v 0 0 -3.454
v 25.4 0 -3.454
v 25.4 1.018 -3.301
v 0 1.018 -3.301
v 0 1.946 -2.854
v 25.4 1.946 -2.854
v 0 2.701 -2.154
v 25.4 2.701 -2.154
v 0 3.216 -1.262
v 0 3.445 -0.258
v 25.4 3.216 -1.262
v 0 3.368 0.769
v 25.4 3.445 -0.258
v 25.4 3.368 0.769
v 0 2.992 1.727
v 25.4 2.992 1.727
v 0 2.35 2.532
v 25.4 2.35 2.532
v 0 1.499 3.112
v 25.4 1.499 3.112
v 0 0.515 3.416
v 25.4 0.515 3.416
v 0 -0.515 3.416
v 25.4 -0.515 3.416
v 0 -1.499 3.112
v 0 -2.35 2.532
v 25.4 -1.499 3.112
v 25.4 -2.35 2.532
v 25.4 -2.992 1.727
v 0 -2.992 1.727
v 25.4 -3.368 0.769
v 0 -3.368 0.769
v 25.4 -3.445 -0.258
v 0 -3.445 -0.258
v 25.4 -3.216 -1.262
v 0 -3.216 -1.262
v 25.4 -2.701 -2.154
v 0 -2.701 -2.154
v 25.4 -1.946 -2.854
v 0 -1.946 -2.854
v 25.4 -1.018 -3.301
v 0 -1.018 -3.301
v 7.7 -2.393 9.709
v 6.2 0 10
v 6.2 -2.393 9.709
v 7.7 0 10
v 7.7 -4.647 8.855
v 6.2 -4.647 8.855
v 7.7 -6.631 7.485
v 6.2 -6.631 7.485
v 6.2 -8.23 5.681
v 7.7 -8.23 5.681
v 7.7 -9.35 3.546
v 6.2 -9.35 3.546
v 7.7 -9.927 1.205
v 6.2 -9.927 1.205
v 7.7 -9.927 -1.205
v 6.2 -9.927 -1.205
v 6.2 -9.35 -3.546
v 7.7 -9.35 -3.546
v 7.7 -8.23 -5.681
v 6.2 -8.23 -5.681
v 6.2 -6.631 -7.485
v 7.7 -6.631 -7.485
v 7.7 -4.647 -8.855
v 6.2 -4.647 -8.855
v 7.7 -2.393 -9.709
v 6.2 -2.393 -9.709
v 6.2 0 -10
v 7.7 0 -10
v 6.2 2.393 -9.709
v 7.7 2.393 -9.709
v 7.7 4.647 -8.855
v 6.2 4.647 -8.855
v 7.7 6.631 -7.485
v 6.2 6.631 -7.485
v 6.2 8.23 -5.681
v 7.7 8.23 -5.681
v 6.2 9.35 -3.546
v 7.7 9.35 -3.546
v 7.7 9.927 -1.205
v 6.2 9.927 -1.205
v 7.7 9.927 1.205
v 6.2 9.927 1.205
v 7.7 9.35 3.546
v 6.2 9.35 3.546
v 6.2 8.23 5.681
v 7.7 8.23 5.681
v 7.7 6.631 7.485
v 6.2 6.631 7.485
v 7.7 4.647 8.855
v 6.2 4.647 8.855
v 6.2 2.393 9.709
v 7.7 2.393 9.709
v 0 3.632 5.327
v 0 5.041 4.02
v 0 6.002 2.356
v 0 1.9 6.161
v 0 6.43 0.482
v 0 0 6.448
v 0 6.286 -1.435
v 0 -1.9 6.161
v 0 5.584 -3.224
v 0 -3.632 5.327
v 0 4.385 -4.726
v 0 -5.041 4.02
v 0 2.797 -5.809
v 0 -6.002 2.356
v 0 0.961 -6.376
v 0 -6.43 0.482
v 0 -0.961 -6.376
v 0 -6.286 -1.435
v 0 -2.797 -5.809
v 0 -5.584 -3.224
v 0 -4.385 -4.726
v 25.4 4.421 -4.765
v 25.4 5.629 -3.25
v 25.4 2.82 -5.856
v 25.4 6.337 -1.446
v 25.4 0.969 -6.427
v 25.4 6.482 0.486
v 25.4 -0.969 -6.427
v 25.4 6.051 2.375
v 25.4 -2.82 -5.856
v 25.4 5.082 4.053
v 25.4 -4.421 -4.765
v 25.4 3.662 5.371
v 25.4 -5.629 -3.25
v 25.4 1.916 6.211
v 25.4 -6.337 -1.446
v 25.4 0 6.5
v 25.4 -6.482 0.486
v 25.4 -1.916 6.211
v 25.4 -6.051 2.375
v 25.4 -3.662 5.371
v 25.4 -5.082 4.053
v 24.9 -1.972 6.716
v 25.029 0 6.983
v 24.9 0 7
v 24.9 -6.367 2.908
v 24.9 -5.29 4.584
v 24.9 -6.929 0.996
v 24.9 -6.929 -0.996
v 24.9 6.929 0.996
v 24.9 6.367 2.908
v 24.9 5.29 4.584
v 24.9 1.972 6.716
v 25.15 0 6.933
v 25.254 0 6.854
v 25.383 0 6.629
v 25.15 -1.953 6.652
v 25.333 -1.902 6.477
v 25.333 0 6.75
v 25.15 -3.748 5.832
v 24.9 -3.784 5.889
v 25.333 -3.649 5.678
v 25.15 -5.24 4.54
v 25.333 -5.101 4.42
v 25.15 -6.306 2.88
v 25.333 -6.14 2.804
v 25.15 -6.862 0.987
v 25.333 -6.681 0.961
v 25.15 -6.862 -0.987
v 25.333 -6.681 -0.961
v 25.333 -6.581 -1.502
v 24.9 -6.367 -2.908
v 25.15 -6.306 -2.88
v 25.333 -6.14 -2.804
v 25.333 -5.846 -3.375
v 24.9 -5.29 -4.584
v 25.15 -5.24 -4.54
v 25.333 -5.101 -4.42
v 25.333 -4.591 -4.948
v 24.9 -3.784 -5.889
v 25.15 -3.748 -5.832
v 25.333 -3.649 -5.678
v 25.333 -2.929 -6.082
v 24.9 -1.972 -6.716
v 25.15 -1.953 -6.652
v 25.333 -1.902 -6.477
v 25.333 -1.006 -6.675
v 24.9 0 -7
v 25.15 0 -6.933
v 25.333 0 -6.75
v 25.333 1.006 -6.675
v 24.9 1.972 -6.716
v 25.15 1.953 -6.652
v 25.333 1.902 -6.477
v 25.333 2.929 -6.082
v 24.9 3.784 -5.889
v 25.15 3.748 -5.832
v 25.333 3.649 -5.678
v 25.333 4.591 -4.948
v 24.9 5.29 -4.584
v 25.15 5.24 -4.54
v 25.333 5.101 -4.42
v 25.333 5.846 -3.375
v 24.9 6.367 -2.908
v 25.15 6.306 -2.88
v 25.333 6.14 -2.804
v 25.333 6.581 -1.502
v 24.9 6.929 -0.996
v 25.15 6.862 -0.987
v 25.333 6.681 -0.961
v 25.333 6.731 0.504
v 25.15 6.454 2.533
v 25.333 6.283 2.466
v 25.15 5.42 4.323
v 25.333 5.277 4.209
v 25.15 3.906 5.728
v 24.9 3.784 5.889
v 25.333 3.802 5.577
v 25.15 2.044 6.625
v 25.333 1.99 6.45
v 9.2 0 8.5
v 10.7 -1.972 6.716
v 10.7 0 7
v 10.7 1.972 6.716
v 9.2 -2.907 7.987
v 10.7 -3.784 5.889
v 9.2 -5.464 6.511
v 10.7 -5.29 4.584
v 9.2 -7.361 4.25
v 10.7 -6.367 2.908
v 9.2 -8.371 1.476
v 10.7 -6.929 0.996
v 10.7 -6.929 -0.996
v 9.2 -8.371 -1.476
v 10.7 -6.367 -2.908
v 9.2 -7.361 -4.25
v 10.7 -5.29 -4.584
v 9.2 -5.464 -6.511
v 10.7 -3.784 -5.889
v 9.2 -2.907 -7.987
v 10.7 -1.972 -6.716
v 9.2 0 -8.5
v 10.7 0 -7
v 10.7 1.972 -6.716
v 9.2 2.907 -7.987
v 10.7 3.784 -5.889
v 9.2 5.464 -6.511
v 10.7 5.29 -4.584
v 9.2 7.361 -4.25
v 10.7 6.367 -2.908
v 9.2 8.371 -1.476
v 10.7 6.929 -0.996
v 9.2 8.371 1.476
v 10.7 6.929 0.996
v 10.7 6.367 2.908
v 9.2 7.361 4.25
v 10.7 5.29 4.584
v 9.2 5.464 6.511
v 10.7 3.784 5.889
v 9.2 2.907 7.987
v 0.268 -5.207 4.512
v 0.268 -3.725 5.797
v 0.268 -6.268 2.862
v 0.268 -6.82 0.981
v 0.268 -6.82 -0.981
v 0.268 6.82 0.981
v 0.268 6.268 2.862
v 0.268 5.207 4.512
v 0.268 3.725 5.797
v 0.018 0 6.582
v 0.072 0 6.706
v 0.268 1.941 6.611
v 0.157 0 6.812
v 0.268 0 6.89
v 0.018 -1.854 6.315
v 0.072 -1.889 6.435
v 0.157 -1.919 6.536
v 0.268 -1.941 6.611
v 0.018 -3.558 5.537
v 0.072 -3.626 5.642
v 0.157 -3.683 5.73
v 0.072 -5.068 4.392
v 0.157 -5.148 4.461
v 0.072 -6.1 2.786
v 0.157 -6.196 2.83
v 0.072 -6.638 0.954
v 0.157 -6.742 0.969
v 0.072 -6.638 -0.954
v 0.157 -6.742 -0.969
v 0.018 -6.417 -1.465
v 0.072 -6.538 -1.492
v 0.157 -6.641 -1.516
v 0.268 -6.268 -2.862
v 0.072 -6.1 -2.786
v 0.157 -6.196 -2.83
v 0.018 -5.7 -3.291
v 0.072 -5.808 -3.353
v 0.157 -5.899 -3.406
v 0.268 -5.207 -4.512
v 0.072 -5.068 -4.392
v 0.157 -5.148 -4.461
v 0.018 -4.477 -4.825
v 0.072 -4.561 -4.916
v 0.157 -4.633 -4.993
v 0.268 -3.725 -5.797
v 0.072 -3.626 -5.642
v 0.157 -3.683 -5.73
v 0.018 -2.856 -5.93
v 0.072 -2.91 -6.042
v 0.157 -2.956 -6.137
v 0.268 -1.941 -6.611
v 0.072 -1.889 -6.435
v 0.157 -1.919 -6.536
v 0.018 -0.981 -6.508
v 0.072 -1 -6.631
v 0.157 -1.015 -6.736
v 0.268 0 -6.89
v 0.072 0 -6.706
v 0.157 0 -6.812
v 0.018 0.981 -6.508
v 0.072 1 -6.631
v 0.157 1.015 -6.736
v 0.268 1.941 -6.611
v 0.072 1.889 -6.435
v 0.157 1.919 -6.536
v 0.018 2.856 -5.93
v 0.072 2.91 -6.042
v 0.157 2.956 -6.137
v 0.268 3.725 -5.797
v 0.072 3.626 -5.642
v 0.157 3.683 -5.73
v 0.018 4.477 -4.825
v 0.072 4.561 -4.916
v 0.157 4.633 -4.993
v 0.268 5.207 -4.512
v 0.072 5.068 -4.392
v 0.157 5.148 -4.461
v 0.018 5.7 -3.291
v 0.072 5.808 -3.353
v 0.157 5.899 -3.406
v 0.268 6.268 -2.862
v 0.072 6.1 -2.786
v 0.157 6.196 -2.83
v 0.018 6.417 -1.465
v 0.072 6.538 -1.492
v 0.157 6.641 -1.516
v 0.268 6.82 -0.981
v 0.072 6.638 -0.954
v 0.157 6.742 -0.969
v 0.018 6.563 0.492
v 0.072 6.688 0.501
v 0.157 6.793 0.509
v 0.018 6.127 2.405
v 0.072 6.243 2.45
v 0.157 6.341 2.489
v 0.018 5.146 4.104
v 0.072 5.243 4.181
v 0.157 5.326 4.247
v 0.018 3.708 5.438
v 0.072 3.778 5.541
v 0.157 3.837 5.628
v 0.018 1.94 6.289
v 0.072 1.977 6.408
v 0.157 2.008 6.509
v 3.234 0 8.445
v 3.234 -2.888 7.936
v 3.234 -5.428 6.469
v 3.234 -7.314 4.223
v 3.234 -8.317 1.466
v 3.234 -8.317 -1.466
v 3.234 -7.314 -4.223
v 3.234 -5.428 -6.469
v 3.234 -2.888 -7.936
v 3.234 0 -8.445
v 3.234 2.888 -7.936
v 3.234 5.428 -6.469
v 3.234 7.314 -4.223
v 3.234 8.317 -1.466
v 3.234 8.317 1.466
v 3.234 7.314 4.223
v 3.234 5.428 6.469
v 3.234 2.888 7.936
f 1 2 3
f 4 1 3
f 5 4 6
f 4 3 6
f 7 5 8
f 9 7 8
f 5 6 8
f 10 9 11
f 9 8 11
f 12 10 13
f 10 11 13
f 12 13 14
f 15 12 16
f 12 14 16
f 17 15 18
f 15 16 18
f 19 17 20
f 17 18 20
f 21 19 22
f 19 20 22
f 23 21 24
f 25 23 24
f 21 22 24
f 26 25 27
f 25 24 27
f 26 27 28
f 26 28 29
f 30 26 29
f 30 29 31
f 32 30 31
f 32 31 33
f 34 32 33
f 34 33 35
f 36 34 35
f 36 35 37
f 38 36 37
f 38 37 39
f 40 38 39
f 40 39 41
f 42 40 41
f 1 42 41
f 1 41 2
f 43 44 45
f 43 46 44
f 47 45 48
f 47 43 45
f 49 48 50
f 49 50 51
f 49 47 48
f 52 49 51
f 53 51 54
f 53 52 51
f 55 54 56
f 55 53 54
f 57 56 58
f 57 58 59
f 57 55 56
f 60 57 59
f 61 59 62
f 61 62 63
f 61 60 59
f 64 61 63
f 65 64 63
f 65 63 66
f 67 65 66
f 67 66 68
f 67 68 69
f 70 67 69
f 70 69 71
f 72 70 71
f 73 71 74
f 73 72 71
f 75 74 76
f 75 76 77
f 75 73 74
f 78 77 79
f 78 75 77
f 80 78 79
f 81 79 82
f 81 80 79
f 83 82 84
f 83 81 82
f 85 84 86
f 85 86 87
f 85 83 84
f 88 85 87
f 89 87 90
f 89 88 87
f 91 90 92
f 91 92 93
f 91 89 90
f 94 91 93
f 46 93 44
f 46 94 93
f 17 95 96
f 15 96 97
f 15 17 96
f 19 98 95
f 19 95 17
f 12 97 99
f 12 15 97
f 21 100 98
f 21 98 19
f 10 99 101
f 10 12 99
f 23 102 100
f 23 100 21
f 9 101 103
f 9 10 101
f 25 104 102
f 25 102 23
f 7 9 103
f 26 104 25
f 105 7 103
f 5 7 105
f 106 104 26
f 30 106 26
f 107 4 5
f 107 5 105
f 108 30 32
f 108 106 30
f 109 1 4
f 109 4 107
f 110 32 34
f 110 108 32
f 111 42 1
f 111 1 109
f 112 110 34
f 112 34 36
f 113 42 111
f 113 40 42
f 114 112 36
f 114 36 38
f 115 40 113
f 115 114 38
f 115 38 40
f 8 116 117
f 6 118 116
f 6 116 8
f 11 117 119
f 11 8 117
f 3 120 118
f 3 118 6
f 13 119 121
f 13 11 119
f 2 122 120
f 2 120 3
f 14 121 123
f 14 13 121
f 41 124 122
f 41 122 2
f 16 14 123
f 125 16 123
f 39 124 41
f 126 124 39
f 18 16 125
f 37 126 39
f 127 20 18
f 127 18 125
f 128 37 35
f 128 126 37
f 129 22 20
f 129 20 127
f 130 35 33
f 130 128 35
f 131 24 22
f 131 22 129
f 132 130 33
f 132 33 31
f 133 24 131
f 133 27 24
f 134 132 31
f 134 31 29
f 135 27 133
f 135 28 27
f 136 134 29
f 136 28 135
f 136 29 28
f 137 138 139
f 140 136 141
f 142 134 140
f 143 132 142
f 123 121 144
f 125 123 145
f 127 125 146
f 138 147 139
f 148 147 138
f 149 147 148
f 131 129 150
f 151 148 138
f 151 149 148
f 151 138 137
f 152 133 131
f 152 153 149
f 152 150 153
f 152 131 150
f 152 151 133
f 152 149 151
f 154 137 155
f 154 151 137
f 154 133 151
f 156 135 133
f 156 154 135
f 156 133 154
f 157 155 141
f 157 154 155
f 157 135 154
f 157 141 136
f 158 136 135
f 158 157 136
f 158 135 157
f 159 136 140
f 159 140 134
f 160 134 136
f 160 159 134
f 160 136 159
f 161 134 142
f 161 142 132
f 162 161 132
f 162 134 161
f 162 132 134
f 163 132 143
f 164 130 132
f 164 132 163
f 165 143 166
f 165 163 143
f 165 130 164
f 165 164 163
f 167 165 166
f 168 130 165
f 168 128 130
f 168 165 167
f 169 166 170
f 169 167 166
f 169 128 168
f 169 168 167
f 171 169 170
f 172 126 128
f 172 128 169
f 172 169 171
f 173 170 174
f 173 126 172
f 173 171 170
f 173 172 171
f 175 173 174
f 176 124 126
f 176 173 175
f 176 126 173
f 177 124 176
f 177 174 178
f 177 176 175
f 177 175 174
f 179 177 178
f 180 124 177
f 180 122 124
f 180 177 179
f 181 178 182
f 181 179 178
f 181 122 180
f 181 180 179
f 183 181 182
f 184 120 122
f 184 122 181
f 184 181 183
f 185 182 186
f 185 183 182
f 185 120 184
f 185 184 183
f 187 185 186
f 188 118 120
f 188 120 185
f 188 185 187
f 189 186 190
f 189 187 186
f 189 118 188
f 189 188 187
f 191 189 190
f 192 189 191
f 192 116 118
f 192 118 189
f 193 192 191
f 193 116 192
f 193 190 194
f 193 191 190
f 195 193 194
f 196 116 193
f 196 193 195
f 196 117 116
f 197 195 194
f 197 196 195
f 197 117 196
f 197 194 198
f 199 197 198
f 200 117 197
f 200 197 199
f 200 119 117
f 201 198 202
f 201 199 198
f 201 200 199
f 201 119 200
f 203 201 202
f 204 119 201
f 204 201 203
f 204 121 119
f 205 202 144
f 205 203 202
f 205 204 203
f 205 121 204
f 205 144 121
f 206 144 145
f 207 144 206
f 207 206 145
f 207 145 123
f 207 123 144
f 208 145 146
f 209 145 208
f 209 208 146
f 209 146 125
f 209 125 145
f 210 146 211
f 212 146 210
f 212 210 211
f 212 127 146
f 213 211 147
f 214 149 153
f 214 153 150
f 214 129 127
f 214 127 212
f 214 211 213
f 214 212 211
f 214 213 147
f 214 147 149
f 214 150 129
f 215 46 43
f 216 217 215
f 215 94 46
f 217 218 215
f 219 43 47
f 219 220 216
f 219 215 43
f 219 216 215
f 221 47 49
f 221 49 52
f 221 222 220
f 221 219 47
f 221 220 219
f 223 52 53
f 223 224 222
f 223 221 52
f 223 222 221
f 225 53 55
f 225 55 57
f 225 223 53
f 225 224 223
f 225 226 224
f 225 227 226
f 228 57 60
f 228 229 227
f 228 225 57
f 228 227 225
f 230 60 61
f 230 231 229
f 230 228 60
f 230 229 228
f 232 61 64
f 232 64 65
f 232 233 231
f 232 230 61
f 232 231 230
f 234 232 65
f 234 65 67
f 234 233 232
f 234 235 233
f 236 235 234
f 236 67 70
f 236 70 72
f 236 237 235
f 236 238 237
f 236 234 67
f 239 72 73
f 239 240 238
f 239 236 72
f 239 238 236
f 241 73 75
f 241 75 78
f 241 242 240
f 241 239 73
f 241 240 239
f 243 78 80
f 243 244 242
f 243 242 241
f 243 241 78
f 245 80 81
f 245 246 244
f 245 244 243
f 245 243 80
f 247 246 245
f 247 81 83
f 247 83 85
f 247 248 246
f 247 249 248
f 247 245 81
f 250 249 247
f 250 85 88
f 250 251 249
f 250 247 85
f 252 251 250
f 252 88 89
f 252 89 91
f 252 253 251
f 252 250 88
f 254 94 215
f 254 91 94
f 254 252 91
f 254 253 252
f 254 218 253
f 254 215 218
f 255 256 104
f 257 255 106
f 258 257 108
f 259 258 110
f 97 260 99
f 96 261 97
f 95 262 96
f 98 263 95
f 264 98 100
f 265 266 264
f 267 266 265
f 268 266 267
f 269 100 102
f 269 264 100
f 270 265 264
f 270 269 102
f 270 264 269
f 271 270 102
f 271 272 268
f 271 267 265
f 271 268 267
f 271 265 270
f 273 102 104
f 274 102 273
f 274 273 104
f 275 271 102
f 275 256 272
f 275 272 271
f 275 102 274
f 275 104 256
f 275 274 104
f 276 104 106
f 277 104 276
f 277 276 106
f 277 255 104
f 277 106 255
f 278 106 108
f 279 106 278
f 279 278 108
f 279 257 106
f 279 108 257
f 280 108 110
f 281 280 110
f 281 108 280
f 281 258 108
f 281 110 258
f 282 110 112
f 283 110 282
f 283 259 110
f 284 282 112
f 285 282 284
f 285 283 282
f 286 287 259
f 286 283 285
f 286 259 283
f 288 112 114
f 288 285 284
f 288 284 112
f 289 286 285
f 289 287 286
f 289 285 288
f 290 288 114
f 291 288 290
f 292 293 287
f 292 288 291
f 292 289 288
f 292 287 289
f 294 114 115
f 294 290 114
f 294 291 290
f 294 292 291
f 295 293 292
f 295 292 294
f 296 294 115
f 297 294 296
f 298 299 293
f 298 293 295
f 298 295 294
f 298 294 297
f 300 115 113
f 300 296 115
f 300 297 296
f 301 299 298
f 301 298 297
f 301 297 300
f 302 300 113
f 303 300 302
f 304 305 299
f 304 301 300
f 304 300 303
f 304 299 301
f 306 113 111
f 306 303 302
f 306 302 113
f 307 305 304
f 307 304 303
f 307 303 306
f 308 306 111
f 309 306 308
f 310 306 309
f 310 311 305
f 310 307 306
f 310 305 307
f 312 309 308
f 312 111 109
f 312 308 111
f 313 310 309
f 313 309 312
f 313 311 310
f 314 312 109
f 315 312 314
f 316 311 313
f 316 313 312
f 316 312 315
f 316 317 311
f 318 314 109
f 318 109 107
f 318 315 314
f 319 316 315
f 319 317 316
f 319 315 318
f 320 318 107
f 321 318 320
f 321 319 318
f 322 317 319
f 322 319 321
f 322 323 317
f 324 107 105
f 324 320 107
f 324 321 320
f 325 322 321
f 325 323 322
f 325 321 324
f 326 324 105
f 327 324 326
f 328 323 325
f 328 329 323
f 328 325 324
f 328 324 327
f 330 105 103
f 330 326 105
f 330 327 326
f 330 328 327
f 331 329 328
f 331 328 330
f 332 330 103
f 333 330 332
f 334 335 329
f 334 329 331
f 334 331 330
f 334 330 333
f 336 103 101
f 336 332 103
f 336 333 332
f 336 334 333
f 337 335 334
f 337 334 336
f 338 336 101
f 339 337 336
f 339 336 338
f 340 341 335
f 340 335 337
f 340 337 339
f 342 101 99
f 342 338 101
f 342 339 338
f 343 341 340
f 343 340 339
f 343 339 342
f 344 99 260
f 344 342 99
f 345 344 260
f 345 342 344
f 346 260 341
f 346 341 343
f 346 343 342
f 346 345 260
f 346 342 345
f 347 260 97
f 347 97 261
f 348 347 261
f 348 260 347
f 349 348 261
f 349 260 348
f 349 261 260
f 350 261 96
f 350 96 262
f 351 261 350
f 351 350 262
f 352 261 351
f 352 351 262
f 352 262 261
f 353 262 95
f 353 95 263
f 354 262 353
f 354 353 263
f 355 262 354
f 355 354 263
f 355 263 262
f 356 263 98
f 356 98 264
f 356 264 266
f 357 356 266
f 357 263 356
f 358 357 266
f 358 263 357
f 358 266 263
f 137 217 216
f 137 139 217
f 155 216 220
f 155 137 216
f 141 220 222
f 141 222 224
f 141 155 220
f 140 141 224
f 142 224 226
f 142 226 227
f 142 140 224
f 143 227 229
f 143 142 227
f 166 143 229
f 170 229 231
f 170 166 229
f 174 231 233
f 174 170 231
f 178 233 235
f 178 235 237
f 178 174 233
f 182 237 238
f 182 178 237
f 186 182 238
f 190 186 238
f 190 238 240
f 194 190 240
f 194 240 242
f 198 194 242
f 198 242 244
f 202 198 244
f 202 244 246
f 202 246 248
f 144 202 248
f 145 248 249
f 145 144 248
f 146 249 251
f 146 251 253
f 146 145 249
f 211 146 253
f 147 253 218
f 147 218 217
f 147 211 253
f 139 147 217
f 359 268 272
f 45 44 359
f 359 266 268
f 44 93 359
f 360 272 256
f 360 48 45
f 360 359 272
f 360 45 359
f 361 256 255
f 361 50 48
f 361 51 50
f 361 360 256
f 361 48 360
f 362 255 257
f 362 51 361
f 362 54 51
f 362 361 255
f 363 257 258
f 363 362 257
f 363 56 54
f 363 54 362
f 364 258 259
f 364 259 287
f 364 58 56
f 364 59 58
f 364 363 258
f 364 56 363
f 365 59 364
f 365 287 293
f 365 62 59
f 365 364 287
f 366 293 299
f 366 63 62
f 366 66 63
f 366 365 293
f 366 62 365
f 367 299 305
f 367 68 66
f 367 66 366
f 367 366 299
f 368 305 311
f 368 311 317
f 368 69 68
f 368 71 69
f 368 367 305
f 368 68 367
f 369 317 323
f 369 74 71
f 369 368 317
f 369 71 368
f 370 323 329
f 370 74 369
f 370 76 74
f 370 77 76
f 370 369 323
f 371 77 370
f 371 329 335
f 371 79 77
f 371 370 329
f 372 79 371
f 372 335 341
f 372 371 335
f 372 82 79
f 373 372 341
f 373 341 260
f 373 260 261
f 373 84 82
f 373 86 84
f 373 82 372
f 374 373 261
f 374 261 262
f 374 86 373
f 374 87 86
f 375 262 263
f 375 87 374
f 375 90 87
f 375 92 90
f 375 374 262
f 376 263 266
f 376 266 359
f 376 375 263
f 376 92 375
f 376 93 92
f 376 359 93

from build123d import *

# Parameters (mm, degrees)
TAP_DRILL_FOR_5_16_24_TAP1_D = 6.9088


with BuildPart() as part:
    # Sketch1 → Revolve1 (revolve)
    with BuildSketch(Plane.XY, mode=Mode.PRIVATE) as revolve1_sk:
        with BuildLine():
            Line((0, 0), (0, 6.447566244))
            ThreePointArc((0, 6.447566244), (0.072174996, 6.70634369), (0.267863065, 6.89041209))
            Line((0.267863065, 6.89041209), (6.2, 10))
            Line((6.2, 10), (7.7, 10))
            Line((7.7, 10), (10.7, 7))
            Line((10.7, 7), (24.9, 7))
            ThreePointArc((24.9, 7), (25.253553391, 6.853553391), (25.4, 6.5))
            Line((25.4, 6.5), (25.4, 0))
            Line((25.4, 0), (0, 0))
        make_face()
    revolve(revolve1_sk.sketch.rotate(Axis((-16.664675737, 0, 0), (1, 0, 0)), 90), axis=Axis((-16.664675737, 0, 0), (1, 0, 0)))

    # Tap Drill for 5/16-24 Tap1 (through all)
    with Locations(Plane.ZY):
        with Locations((0, 0)):
            Hole(TAP_DRILL_FOR_5_16_24_TAP1_D / 2)


solid = part.part
